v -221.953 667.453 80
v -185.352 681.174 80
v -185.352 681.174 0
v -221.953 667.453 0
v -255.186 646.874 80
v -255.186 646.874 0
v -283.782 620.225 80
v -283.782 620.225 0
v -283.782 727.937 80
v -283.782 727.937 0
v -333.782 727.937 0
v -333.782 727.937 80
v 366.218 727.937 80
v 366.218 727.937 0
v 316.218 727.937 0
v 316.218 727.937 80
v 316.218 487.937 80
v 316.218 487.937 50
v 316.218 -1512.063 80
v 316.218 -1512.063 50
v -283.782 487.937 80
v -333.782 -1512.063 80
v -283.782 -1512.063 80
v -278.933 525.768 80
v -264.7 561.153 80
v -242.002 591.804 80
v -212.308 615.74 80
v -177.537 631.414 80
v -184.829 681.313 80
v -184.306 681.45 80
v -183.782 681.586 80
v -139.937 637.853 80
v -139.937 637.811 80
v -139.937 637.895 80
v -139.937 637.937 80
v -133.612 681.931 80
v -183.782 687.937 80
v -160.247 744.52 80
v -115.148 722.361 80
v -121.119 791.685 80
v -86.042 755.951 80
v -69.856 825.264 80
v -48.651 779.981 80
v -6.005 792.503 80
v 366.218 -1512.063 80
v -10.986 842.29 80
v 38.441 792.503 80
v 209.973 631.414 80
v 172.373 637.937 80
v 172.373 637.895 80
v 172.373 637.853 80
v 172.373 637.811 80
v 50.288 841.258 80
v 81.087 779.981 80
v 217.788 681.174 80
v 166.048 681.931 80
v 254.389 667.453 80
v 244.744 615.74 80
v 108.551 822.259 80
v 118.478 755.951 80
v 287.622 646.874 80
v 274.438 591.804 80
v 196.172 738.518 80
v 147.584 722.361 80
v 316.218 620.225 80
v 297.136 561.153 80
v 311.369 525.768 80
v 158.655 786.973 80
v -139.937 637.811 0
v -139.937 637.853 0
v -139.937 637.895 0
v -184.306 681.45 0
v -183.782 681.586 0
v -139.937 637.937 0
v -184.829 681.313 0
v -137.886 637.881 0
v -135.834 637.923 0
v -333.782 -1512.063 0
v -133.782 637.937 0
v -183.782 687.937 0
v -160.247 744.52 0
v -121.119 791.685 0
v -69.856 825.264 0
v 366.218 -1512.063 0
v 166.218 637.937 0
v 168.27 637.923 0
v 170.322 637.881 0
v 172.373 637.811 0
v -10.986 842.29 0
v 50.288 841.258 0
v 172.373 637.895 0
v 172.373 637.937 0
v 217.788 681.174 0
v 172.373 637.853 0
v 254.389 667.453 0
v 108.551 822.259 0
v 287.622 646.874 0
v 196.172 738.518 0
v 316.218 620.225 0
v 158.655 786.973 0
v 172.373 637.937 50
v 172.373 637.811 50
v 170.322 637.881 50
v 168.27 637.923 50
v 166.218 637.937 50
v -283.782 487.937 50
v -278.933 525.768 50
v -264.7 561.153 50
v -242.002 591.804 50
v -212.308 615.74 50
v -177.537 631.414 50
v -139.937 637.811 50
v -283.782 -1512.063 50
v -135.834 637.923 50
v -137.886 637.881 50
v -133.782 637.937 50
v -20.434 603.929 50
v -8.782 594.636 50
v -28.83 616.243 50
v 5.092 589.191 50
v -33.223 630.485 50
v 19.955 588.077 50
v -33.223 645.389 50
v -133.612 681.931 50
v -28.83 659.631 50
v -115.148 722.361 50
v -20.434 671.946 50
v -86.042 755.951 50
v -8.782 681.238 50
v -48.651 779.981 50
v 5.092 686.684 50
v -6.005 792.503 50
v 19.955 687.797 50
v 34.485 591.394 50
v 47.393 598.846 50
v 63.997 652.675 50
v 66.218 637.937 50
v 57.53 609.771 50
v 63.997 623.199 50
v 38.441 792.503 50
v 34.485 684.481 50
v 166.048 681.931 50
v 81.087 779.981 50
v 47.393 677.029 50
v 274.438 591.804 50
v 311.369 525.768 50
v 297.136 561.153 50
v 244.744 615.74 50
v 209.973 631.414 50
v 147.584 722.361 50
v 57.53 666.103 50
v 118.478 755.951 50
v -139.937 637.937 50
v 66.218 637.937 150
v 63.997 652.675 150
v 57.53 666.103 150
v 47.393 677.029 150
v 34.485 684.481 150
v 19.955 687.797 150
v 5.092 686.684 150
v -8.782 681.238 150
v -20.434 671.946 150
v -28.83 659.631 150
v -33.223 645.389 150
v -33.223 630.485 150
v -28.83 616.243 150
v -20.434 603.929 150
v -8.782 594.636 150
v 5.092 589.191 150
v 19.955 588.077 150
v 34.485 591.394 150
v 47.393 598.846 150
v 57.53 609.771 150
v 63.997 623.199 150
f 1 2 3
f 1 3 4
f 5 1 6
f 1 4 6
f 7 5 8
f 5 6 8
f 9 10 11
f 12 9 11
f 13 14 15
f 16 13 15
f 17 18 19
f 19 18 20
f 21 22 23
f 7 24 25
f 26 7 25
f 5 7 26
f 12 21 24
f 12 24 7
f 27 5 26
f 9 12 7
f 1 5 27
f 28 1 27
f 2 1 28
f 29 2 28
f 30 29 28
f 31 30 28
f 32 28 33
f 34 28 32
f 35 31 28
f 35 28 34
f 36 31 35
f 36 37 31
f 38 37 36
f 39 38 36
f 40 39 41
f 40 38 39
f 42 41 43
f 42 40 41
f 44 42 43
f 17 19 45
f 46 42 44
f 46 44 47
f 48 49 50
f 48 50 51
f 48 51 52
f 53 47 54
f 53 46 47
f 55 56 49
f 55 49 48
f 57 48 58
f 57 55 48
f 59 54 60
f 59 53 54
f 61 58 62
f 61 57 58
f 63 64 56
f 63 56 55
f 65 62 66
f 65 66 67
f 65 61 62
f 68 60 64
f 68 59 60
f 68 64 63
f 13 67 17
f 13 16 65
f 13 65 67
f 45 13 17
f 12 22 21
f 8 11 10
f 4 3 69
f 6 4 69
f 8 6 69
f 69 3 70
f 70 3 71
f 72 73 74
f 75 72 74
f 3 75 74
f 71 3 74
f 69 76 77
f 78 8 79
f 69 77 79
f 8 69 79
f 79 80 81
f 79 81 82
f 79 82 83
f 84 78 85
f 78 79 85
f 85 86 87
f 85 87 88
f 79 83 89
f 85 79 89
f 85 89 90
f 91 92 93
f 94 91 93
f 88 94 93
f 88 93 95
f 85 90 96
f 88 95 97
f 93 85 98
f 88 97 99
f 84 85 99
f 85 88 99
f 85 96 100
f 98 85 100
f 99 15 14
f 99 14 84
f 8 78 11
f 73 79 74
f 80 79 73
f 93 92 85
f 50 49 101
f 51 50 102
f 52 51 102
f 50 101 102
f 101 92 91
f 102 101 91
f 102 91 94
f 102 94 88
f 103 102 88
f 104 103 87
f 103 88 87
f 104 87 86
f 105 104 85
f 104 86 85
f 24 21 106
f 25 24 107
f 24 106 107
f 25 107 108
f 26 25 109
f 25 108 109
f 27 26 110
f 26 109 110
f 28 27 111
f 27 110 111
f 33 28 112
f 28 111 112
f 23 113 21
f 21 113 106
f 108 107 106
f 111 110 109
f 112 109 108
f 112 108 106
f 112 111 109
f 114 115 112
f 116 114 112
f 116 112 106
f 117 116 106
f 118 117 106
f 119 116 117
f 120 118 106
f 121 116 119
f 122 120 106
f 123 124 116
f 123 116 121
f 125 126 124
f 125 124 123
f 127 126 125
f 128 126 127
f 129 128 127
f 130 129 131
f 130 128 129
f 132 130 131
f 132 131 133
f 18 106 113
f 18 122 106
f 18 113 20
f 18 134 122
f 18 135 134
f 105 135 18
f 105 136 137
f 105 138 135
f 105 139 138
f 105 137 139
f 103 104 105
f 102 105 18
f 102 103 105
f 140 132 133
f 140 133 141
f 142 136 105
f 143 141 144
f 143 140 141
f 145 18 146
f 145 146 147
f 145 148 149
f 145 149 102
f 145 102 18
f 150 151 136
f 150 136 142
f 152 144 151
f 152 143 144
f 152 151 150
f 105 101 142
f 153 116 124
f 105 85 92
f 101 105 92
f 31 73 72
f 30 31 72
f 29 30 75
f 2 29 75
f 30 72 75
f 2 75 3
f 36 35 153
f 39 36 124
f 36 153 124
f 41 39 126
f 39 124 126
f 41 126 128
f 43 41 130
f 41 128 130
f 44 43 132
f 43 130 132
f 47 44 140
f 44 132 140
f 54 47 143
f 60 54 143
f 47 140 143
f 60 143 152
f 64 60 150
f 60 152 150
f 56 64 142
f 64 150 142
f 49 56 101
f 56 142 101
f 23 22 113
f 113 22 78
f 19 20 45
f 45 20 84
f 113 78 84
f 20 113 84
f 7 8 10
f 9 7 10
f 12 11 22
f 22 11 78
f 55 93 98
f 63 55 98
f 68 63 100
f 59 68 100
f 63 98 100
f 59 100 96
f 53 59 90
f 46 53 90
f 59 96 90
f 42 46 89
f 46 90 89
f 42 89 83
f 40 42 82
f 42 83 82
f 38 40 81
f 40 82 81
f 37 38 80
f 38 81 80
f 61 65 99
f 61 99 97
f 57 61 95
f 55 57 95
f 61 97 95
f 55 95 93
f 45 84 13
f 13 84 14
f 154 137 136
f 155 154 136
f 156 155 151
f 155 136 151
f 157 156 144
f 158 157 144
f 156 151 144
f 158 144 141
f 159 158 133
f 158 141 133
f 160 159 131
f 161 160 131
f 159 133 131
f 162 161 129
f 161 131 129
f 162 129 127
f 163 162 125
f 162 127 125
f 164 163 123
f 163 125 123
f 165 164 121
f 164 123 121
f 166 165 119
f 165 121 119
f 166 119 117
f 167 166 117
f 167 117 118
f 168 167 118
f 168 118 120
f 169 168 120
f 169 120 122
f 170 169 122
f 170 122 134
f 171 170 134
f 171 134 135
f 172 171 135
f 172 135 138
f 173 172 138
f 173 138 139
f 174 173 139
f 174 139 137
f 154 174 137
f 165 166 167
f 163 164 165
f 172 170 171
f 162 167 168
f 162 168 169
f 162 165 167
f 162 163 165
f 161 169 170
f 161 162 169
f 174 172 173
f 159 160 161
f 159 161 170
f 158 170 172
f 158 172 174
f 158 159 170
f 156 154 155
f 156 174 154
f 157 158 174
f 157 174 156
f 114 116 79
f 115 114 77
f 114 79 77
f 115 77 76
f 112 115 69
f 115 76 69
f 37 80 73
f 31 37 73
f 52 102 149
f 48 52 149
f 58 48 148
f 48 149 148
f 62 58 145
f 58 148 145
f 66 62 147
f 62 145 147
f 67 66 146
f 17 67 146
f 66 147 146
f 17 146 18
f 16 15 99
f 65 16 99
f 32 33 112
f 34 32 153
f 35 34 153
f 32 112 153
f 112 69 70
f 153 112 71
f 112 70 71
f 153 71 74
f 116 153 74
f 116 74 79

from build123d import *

# Parameters (mm, degrees)
SKETCH2_R           = 50
BOSS_EXTRUDE3_DEPTH = 50
BOSS_EXTRUDE4_DEPTH = 80
SKETCH2_9_R         = 50
BOSS_EXTRUDE5_DEPTH = 150


with BuildPart() as part:
    # Sketch2 → Boss-Extrude3 (new body)
    with BuildSketch(Plane.XY):
        with BuildLine():
            Line((-283.78190134, 487.937190165), (-283.78190134, -1512.062809835))
            Line((-283.78190134, -1512.062809835), (316.21809866, -1512.062809835))
            Line((316.21809866, -1512.062809835), (316.21809866, 487.937190165))
            ThreePointArc((316.21809866, 487.937190165), (274.438439922, 591.804209653), (172.37332883, 637.810847428))
            ThreePointArc((172.37332883, 637.810847428), (169.296362007, 637.905601155), (166.21809866, 637.937190165))
            Line((166.21809866, 637.937190165), (172.373379941, 637.937190165))
            ThreePointArc((172.373379941, 637.937190165), (16.21809866, 794.092471446), (-139.937182621, 637.937190165))
            Line((-139.937182621, 637.937190165), (-139.660119377, 637.937190165))
            Line((-139.660119377, 637.937190165), (-133.78190134, 637.937190165))
            ThreePointArc((-133.78190134, 637.937190165), (-136.860164687, 637.905601155), (-139.93713151, 637.810847428))
            ThreePointArc((-139.93713151, 637.810847428), (-242.002242601, 591.804209653), (-283.78190134, 487.937190165))
        make_face()
        with Locations((16.21809866, 637.937190165)):
            Circle(SKETCH2_R, mode=Mode.SUBTRACT)
    extrude(amount=BOSS_EXTRUDE3_DEPTH)

    # Sketch2<8> → Boss-Extrude4 (add)
    with BuildSketch(Plane.XY):
        with BuildLine():
            Line((-333.78190134, 487.937190165), (-333.78190134, -1512.062809835))
            Line((-333.78190134, -1512.062809835), (-283.78190134, -1512.062809835))
            Line((-283.78190134, -1512.062809835), (-283.78190134, 487.937190165))
            ThreePointArc((-283.78190134, 487.937190165), (-242.002242601, 591.804209653), (-139.93713151, 637.810847428))
            ThreePointArc((-139.93713151, 637.810847428), (-139.937169843, 637.874018792), (-139.937182621, 637.937190165))
            ThreePointArc((-139.937182621, 637.937190165), (16.21809866, 794.092471446), (172.373379941, 637.937190165))
            ThreePointArc((172.373379941, 637.937190165), (172.373367163, 637.874018792), (172.37332883, 637.810847428))
            ThreePointArc((172.37332883, 637.810847428), (274.438439922, 591.804209653), (316.21809866, 487.937190165))
            Line((316.21809866, 487.937190165), (316.21809866, -1512.062809835))
            Line((316.21809866, -1512.062809835), (366.21809866, -1512.062809835))
            Line((366.21809866, -1512.062809835), (366.21809866, 487.937190165))
            Line((366.21809866, 487.937190165), (366.21809866, 727.937190165))
            Line((366.21809866, 727.937190165), (316.21809866, 727.937190165))
            Line((316.21809866, 727.937190165), (316.21809866, 620.224755718))
            ThreePointArc((316.21809866, 620.224755718), (271.509827539, 657.977337865), (217.788355507, 681.174113678))
            ThreePointArc((217.788355507, 681.174113678), (19.689586458, 844.063240853), (-183.78190134, 687.937190165))
            Line((-183.78190134, 687.937190165), (-183.78190134, 681.586357475))
            ThreePointArc((-183.78190134, 681.586357475), (-184.567448055, 681.381828873), (-185.352158186, 681.174113678))
            ThreePointArc((-185.352158186, 681.174113678), (-239.073630218, 657.977337865), (-283.78190134, 620.224755718))
            Line((-283.78190134, 620.224755718), (-283.78190134, 727.937190165))
            Line((-283.78190134, 727.937190165), (-333.78190134, 727.937190165))
            Line((-333.78190134, 727.937190165), (-333.78190134, 487.937190165))
        make_face()
    extrude(amount=BOSS_EXTRUDE4_DEPTH)

    # Sketch2<9> → Boss-Extrude5 (add)
    with BuildSketch(Plane.XY):
        with Locations((16.21809866, 637.937190165)):
            Circle(SKETCH2_9_R)
    extrude(amount=BOSS_EXTRUDE5_DEPTH)


solid = part.part
